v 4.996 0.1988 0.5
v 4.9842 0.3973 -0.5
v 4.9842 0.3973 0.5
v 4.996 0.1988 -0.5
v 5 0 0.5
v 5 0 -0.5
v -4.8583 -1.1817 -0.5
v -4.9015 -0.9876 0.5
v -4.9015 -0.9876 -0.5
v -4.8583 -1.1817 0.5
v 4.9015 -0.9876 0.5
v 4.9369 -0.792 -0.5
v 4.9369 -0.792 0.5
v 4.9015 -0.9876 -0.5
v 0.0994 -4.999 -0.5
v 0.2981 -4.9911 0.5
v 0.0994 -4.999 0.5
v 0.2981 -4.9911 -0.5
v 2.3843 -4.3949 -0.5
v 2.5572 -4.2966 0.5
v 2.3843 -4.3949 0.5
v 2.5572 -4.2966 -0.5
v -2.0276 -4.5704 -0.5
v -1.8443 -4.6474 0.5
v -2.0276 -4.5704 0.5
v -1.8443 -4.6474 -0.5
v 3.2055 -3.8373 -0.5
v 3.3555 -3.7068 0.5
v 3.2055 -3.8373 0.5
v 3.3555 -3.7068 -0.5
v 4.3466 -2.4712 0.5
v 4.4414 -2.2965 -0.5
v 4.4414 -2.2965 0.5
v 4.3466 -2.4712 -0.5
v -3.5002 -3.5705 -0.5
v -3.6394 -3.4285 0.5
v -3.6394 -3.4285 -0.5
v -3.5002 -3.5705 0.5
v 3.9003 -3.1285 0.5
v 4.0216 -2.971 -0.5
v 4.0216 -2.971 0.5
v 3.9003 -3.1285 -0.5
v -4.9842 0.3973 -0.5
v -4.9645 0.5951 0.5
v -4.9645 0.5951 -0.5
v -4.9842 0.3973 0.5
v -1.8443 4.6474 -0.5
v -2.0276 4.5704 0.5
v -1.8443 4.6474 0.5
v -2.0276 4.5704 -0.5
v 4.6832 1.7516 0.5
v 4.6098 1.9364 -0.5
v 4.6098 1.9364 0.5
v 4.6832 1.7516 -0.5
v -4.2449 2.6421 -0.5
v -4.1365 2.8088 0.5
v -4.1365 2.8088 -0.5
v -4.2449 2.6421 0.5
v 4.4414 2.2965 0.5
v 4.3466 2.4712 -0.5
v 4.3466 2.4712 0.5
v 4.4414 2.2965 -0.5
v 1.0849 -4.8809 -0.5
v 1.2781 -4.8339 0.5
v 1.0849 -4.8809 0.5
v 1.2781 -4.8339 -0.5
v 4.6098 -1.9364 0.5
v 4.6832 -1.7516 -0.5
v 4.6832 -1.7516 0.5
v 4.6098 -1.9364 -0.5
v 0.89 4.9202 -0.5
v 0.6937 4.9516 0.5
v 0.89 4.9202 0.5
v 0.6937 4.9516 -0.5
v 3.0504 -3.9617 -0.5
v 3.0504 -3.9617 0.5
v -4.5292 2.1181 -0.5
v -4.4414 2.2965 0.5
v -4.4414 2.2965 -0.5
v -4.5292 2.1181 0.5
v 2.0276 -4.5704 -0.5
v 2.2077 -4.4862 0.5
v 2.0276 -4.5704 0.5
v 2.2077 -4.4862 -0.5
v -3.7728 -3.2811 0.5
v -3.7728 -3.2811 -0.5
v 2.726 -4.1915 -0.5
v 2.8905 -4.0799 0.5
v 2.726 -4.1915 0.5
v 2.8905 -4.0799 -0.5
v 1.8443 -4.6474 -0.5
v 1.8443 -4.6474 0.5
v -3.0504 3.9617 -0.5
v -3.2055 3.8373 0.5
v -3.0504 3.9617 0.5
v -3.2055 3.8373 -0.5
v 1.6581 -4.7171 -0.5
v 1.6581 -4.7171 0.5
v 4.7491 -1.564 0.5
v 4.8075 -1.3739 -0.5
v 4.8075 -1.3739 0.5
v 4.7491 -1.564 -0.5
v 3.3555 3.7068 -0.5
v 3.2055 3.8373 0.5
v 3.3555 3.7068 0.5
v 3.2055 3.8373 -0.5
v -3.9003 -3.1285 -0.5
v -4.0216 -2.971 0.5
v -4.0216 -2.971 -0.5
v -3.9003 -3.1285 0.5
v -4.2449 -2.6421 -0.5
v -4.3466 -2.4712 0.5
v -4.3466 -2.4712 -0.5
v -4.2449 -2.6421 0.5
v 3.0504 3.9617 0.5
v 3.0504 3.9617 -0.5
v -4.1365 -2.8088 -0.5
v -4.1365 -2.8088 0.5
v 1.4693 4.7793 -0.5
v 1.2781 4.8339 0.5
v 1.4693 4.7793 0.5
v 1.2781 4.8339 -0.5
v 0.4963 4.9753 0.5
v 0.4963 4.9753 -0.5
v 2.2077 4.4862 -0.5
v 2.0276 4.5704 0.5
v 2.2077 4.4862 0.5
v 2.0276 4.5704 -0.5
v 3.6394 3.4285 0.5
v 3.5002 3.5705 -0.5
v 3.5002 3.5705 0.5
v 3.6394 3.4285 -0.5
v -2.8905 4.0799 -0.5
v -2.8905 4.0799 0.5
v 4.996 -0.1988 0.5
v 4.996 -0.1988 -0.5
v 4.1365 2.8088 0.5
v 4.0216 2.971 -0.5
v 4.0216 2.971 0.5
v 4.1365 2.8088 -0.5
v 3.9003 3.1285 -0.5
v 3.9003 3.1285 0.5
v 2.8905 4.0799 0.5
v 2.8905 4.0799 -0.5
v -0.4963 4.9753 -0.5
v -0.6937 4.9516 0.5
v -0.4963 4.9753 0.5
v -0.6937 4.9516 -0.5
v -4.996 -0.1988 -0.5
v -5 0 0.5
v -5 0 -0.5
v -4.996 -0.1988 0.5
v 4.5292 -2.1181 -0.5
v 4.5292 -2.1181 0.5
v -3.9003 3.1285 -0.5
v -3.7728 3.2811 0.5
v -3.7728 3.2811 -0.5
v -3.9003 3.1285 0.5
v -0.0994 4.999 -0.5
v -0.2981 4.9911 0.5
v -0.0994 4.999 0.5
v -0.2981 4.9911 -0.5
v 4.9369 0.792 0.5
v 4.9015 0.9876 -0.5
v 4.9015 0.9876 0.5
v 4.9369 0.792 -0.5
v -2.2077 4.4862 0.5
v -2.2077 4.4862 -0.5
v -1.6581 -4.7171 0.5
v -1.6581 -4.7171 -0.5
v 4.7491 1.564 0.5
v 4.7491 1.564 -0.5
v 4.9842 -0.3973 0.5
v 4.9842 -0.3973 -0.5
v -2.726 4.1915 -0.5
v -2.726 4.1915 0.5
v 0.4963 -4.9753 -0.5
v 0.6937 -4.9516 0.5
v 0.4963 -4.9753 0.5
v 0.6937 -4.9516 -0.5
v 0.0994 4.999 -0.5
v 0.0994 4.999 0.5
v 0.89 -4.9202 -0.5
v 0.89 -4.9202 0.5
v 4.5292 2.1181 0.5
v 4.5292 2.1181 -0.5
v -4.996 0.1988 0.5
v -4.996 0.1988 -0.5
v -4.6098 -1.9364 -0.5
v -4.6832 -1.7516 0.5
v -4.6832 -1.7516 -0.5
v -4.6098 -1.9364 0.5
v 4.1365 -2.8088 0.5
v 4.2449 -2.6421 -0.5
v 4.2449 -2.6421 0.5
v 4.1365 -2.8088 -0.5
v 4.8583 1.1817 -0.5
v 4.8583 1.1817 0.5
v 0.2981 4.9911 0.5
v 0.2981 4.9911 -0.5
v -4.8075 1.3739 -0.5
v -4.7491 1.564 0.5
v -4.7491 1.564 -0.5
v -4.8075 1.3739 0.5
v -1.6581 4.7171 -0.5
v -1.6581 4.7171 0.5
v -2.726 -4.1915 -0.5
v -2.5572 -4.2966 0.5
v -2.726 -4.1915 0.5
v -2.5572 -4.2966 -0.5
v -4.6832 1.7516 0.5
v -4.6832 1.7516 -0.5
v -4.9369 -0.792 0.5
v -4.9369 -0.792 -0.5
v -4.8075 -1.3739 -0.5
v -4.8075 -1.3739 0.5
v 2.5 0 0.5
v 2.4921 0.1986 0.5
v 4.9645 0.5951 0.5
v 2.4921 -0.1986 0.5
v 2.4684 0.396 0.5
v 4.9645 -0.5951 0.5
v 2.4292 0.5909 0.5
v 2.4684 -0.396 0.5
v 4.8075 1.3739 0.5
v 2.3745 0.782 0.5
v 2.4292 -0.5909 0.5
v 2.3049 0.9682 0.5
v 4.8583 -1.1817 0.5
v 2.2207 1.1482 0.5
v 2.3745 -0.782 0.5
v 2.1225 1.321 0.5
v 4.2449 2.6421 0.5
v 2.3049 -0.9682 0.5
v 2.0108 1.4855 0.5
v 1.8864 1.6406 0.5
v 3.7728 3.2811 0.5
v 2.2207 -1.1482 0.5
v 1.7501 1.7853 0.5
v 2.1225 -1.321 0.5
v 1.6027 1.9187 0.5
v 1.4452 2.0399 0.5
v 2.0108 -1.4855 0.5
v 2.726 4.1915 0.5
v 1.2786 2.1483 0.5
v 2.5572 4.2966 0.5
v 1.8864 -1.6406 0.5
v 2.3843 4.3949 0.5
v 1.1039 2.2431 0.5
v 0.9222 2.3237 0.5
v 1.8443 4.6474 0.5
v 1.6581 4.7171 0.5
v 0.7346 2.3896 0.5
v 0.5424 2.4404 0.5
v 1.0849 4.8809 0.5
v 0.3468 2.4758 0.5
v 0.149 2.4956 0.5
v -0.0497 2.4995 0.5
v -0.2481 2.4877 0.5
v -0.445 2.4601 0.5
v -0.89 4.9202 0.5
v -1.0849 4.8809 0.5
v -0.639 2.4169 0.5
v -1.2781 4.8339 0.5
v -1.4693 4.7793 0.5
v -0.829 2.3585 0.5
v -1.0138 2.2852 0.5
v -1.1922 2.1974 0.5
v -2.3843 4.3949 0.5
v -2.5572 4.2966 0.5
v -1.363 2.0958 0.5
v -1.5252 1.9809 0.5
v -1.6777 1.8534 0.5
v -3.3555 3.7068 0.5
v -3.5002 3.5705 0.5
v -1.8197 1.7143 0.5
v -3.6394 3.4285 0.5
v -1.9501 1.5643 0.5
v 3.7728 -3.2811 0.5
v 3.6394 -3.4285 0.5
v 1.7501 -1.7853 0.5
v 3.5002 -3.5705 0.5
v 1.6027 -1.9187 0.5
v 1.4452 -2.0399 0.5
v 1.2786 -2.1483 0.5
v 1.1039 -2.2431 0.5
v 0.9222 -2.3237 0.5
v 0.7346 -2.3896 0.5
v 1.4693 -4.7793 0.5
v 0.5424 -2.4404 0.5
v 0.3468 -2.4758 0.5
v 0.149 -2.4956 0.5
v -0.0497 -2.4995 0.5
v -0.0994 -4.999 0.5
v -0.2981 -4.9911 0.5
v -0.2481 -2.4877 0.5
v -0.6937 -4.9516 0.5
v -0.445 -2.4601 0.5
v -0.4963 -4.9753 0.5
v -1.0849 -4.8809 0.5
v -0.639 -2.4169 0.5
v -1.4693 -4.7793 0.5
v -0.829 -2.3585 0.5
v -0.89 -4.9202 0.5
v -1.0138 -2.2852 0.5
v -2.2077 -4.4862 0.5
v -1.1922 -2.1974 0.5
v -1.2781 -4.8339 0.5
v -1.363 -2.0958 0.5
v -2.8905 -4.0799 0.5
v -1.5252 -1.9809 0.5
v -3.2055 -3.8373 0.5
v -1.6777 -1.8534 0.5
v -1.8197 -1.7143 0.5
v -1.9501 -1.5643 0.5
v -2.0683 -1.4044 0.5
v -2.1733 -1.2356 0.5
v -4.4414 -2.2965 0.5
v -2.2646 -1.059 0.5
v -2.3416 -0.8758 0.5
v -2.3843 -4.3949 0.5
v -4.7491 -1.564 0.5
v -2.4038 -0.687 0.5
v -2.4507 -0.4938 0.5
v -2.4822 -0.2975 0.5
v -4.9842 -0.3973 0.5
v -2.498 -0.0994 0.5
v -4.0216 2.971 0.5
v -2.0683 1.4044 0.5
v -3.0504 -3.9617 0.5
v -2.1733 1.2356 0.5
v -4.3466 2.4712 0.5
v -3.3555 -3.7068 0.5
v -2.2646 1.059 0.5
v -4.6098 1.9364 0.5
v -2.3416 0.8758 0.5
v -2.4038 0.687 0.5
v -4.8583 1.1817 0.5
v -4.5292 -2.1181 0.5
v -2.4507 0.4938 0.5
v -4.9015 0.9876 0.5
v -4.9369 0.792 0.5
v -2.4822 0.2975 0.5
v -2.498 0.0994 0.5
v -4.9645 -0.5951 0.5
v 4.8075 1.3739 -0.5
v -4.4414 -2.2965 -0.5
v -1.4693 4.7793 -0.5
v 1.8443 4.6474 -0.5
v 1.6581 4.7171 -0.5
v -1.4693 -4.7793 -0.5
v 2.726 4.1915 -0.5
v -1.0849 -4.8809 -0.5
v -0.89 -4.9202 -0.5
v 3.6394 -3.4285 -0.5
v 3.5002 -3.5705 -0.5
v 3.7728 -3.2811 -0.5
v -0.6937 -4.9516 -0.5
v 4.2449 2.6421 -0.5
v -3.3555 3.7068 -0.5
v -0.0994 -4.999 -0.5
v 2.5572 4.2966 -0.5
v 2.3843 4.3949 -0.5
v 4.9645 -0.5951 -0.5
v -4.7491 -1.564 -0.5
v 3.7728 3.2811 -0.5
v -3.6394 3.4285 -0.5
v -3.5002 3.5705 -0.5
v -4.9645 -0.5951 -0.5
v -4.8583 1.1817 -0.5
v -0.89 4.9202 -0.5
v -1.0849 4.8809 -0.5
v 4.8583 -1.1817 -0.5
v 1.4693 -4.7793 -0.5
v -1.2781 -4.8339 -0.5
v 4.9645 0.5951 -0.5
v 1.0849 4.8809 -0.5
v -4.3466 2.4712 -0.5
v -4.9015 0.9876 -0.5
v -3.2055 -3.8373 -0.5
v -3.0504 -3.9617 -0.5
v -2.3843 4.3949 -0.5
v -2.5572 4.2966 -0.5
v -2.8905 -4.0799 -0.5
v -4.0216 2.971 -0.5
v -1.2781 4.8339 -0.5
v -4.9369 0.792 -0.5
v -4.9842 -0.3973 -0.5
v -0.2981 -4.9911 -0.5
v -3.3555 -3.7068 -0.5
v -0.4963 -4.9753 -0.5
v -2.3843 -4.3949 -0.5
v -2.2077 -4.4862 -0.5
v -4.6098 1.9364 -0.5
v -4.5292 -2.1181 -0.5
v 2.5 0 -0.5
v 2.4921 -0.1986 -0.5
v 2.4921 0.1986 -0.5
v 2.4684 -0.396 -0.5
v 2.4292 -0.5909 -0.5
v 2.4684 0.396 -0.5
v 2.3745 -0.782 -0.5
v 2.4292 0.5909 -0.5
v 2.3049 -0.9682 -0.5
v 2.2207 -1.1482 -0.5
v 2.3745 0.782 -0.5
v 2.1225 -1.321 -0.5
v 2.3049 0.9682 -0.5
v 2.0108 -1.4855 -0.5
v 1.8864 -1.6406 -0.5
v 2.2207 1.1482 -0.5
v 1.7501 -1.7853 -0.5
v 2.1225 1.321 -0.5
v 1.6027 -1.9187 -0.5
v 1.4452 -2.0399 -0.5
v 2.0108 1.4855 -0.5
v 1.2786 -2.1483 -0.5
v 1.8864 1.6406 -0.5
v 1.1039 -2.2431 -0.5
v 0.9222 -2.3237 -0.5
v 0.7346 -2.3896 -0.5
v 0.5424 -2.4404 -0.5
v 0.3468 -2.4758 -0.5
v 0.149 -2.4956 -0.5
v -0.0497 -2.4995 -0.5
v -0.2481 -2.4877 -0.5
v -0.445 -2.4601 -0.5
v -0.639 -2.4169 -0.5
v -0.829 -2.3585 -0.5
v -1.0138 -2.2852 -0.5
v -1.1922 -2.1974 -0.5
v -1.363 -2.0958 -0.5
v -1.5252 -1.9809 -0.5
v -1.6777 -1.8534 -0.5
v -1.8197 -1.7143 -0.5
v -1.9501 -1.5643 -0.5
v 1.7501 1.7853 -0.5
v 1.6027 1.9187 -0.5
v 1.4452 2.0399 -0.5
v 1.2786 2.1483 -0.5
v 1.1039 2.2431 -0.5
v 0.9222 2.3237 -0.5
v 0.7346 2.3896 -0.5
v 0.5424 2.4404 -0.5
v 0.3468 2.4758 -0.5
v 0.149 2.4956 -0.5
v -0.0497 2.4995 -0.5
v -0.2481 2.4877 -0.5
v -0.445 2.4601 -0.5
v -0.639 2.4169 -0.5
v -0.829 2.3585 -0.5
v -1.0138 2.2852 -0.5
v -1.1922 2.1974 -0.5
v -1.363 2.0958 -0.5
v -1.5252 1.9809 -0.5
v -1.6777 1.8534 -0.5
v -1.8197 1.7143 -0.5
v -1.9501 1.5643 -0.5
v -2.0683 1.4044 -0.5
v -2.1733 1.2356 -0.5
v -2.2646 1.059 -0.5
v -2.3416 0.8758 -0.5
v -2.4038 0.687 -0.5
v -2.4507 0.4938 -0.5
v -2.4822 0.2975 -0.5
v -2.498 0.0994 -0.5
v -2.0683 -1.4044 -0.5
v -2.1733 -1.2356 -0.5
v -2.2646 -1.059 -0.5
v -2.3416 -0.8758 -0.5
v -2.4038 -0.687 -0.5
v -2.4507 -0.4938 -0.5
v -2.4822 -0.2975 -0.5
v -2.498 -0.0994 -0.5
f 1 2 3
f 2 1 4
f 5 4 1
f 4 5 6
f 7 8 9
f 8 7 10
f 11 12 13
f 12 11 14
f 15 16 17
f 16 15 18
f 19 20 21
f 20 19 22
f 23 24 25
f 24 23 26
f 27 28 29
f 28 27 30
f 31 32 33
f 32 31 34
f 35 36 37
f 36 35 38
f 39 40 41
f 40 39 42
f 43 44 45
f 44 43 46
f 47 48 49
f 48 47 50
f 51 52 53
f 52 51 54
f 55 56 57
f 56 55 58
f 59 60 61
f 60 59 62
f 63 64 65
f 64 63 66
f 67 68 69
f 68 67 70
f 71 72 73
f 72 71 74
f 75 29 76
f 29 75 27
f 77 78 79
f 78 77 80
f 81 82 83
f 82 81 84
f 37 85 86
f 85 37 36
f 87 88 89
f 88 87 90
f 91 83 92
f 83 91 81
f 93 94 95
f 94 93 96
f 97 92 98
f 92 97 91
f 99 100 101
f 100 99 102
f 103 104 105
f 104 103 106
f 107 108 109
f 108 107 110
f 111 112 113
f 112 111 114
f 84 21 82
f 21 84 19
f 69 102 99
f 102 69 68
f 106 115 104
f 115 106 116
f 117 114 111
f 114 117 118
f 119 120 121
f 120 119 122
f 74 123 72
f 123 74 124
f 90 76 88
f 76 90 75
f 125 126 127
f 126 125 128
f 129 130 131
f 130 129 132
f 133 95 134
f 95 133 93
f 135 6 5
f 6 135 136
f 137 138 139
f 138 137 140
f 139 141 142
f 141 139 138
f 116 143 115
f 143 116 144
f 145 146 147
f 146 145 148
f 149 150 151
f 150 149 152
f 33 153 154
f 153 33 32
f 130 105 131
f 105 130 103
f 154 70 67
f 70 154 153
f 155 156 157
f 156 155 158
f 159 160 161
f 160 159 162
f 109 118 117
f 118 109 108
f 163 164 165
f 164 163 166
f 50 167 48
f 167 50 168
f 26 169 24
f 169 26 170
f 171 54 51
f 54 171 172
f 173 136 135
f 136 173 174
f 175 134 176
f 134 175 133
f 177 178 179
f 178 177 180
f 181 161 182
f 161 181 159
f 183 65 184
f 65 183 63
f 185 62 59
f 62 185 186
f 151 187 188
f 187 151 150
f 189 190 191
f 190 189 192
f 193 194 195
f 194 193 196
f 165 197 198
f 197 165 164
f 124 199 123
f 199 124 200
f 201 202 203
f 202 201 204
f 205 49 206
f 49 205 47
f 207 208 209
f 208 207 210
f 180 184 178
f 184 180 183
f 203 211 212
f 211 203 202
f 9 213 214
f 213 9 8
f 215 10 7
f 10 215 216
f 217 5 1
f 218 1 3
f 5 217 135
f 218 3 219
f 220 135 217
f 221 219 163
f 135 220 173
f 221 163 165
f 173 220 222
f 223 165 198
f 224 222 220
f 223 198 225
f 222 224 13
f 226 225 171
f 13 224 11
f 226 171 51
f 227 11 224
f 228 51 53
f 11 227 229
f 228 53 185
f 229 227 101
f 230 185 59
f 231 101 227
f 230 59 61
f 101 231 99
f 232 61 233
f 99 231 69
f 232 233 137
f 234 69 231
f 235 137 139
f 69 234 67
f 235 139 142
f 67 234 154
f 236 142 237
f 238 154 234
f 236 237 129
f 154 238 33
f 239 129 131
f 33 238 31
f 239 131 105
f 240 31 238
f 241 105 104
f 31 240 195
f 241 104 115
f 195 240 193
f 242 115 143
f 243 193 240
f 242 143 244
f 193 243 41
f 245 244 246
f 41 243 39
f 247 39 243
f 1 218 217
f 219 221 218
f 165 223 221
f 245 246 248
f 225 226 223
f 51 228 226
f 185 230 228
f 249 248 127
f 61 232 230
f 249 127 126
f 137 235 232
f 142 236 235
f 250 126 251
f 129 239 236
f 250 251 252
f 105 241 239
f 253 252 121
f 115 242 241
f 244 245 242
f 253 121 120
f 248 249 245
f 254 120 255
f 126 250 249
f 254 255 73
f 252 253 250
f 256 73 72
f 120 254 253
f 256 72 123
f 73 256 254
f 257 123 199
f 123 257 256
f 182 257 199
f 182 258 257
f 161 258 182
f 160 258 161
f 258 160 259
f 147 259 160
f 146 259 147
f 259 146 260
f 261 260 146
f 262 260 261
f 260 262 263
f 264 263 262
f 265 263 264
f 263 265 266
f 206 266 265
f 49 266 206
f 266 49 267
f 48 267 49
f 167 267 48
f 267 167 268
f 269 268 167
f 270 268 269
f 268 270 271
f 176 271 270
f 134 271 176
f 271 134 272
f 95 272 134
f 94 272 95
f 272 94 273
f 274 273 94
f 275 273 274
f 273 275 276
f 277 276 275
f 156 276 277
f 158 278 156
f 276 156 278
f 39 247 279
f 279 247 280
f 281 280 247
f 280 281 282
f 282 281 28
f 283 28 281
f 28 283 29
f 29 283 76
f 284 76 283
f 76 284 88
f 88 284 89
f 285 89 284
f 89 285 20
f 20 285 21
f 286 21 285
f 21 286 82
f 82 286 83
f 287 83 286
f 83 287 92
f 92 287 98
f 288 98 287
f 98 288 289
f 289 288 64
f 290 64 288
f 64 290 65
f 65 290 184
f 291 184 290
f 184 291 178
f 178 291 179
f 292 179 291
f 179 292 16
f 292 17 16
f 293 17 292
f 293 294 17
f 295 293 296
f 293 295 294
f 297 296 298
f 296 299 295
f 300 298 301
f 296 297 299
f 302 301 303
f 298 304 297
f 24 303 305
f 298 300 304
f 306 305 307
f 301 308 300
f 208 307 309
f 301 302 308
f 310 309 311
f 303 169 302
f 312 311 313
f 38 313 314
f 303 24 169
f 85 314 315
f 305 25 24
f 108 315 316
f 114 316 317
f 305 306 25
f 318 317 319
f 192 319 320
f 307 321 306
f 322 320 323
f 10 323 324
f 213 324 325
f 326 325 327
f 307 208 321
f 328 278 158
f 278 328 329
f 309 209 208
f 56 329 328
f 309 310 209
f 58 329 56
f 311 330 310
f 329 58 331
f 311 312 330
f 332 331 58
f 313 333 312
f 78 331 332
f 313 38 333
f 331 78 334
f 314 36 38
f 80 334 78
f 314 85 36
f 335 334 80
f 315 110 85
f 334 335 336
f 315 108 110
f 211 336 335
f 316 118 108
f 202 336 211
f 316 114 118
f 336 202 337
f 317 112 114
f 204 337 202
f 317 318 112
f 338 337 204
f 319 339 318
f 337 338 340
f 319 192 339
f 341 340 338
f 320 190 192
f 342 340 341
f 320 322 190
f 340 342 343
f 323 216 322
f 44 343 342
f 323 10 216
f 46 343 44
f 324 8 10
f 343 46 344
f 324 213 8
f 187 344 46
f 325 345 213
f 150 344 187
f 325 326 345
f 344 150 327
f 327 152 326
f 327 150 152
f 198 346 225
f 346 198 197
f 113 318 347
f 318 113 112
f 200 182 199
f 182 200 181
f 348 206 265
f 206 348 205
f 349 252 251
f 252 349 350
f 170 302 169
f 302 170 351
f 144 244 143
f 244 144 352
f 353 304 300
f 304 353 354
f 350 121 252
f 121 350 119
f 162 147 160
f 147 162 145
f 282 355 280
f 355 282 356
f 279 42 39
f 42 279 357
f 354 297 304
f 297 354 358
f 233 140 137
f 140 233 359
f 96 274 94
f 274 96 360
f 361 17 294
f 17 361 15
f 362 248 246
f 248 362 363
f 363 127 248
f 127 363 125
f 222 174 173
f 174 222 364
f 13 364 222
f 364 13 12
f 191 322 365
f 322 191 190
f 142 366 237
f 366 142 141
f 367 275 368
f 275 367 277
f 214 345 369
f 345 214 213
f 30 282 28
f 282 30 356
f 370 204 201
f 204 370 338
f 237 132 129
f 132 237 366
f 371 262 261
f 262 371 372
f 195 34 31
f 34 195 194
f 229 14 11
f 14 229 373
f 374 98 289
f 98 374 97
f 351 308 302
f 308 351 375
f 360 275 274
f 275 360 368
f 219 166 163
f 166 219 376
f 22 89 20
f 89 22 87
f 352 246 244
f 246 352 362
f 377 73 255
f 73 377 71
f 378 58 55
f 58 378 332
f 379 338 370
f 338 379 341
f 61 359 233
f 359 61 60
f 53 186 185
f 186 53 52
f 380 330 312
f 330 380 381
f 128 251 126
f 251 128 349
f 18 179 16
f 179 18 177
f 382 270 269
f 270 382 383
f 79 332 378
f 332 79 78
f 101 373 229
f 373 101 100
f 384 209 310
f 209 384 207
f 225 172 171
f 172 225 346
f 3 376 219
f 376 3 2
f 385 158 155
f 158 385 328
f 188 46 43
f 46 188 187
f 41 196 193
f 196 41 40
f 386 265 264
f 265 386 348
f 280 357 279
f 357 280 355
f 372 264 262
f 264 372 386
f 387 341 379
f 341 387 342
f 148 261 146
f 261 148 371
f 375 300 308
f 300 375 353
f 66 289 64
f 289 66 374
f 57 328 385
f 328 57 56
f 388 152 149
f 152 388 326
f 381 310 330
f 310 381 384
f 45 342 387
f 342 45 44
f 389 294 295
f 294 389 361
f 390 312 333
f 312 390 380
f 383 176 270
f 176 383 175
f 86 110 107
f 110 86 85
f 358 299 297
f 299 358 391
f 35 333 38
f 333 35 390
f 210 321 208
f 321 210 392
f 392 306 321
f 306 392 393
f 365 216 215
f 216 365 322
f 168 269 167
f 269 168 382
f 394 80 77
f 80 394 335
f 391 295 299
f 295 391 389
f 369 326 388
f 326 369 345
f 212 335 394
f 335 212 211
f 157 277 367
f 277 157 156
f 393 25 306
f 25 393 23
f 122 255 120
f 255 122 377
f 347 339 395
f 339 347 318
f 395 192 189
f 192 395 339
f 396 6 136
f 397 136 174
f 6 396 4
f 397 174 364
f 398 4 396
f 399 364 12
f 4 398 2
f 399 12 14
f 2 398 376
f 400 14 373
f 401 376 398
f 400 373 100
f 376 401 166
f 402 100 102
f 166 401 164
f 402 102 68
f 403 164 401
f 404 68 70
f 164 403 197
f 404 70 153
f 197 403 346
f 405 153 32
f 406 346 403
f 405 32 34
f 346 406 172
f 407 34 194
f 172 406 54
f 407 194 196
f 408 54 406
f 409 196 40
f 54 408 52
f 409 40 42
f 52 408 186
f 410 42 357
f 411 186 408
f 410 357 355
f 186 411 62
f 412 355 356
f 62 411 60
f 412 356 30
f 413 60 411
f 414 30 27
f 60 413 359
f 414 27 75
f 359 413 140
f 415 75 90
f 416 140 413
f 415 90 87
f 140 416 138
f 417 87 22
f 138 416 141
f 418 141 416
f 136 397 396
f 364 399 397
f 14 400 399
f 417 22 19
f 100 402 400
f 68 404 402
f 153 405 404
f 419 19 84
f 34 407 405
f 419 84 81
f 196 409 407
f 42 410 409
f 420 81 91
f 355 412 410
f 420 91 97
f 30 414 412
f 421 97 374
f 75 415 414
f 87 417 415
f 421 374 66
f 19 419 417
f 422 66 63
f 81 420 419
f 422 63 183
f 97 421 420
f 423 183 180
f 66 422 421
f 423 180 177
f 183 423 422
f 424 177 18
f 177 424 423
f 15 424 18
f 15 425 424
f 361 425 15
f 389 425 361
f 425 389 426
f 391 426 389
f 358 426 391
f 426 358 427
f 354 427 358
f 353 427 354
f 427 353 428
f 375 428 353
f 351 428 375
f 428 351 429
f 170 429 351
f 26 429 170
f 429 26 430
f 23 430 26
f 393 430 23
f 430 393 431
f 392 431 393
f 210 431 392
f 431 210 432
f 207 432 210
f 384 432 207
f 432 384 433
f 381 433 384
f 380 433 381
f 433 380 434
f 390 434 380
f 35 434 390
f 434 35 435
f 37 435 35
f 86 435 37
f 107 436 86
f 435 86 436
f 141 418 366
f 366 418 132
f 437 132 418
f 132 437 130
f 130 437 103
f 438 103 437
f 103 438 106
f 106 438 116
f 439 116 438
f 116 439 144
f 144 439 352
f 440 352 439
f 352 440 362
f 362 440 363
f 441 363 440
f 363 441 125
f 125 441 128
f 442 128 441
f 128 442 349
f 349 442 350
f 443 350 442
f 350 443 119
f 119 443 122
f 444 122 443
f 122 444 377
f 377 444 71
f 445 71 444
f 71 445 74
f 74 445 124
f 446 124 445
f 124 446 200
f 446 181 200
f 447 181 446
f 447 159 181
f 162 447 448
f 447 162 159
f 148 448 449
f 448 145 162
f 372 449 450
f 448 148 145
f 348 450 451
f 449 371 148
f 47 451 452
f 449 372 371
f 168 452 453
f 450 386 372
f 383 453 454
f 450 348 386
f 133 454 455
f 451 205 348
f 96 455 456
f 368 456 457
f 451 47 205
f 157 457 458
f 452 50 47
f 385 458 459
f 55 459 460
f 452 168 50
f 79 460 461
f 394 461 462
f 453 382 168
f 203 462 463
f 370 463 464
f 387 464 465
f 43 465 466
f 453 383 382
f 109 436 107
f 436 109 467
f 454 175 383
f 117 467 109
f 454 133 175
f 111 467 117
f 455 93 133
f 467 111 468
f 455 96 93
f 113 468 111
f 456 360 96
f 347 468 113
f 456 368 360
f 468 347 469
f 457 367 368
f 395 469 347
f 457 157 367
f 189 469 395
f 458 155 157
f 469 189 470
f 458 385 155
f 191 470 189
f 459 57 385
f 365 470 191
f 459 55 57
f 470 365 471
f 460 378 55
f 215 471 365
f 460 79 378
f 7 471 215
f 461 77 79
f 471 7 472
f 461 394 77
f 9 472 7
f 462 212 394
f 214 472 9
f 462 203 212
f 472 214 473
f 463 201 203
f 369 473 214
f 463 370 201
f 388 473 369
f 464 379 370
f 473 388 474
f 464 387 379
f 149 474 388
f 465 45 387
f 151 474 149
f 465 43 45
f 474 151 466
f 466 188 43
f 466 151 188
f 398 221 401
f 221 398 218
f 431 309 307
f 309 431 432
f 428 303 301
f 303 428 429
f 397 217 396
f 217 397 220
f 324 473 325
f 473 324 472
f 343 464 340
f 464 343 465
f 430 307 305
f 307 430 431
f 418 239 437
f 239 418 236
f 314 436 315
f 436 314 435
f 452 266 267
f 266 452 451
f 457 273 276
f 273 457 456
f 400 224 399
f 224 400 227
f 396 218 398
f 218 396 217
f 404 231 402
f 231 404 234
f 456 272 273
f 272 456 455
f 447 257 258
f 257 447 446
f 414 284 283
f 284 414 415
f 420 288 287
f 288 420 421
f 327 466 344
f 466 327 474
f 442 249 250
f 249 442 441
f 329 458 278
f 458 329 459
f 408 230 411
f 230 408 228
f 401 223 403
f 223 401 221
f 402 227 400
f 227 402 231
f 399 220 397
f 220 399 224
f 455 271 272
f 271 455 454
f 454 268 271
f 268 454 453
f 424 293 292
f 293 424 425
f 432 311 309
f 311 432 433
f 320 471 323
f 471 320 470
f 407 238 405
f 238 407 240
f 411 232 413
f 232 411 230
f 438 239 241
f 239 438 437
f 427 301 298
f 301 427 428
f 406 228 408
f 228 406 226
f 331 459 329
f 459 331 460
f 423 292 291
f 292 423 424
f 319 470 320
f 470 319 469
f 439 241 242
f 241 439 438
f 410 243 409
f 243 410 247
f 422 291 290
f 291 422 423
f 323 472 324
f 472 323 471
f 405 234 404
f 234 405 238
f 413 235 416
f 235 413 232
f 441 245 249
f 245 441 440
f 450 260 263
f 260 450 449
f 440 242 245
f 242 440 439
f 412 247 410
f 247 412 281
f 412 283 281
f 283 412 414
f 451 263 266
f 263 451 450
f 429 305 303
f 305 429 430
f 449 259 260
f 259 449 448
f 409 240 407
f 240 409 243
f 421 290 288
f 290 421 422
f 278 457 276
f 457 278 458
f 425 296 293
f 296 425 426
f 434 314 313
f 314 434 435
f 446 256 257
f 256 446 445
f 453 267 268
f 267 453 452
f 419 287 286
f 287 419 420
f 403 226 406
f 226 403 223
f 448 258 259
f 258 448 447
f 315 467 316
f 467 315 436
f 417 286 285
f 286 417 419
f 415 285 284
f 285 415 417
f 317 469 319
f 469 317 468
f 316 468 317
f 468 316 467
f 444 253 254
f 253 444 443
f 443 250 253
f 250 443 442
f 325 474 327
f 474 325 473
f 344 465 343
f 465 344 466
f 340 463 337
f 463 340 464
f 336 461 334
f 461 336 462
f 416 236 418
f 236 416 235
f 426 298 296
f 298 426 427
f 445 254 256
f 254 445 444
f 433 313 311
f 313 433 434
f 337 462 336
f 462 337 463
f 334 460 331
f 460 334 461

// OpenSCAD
// Flat washer: 5.0mm ID, 10.0mm OD, 1.0mm thickness (single connected solid)

// Dimensions (mm)
id  = 5.0;
od  = 10.0;
thk = 1.0;

// Make circles truly round in renders
$fa = 2;      // max angle per fragment (deg)
$fs = 0.2;    // max size per fragment (mm)
$fn = 0;      // let $fa/$fs control resolution

module washer(id, od, thk) {
    difference() {
        cylinder(h = thk, r = od/2, center = true);
        cylinder(h = thk + 0.2, r = id/2, center = true); // slight extra height ensures clean through-hole
    }
}

washer(id, od, thk);
